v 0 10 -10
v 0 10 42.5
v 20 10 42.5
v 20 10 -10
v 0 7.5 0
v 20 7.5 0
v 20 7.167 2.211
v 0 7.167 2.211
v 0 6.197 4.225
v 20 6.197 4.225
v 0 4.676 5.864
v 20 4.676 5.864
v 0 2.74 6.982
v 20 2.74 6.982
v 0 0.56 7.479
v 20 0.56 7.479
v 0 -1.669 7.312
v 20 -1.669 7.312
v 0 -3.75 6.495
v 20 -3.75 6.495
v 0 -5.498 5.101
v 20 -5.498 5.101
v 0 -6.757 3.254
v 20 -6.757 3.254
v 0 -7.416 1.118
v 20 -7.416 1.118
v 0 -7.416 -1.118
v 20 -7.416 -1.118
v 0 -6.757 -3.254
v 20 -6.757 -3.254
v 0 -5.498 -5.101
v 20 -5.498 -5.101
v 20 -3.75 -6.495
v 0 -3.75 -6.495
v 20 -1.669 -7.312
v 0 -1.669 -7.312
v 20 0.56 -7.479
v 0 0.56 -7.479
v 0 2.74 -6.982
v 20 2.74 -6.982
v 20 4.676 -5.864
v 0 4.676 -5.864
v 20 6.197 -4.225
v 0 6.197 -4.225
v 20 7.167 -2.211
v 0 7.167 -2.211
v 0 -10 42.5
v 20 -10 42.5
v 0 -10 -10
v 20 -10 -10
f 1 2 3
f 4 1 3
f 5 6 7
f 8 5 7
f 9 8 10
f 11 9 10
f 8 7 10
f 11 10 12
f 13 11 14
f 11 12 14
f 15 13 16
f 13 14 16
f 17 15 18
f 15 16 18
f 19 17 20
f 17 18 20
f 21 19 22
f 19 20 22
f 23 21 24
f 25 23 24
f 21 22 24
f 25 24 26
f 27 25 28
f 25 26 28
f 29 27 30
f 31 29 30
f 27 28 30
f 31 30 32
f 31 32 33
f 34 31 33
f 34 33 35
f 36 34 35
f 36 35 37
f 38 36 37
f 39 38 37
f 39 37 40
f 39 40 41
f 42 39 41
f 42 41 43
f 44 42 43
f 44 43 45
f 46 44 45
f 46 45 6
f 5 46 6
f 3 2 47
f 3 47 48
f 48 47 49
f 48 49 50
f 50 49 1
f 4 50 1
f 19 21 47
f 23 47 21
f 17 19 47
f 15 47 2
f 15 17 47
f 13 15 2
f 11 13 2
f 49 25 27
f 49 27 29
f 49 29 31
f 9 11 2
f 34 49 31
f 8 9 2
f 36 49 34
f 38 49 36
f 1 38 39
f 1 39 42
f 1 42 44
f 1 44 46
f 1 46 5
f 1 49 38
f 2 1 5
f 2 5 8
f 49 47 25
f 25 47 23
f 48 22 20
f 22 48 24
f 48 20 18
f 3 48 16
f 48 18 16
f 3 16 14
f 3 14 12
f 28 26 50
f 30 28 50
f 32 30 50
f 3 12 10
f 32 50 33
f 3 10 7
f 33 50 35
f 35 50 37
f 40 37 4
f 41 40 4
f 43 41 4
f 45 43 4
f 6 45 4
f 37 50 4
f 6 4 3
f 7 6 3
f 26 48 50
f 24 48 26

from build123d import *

# Parameters (mm, degrees)
F0_W     = 20
F0_H     = 19.999998
F1_DEPTH = 20
F2_R     = 7.5
F3_DEPTH = 20.001
F4_W     = 20
F4_H     = 20
F5_DEPTH = 32.5


with BuildPart() as f1:
    # F0 (on Right) → F1 (new body)
    with BuildSketch(Plane.YZ):
        Rectangle(F0_W, F0_H)
    extrude(amount=F1_DEPTH)

    # F2 (on face) → F3 (cut, through all)
    with BuildSketch(Plane.YZ.offset(20)):
        Circle(F2_R)
    extrude(amount=-F3_DEPTH, mode=Mode.SUBTRACT)

    # F4 (on face) → F5 (join)
    with BuildSketch(Plane.XY.offset(9.999999)):
        with Locations((10, 0)):
            Rectangle(F4_W, F4_H)
    extrude(amount=F5_DEPTH)


solid = f1.part
